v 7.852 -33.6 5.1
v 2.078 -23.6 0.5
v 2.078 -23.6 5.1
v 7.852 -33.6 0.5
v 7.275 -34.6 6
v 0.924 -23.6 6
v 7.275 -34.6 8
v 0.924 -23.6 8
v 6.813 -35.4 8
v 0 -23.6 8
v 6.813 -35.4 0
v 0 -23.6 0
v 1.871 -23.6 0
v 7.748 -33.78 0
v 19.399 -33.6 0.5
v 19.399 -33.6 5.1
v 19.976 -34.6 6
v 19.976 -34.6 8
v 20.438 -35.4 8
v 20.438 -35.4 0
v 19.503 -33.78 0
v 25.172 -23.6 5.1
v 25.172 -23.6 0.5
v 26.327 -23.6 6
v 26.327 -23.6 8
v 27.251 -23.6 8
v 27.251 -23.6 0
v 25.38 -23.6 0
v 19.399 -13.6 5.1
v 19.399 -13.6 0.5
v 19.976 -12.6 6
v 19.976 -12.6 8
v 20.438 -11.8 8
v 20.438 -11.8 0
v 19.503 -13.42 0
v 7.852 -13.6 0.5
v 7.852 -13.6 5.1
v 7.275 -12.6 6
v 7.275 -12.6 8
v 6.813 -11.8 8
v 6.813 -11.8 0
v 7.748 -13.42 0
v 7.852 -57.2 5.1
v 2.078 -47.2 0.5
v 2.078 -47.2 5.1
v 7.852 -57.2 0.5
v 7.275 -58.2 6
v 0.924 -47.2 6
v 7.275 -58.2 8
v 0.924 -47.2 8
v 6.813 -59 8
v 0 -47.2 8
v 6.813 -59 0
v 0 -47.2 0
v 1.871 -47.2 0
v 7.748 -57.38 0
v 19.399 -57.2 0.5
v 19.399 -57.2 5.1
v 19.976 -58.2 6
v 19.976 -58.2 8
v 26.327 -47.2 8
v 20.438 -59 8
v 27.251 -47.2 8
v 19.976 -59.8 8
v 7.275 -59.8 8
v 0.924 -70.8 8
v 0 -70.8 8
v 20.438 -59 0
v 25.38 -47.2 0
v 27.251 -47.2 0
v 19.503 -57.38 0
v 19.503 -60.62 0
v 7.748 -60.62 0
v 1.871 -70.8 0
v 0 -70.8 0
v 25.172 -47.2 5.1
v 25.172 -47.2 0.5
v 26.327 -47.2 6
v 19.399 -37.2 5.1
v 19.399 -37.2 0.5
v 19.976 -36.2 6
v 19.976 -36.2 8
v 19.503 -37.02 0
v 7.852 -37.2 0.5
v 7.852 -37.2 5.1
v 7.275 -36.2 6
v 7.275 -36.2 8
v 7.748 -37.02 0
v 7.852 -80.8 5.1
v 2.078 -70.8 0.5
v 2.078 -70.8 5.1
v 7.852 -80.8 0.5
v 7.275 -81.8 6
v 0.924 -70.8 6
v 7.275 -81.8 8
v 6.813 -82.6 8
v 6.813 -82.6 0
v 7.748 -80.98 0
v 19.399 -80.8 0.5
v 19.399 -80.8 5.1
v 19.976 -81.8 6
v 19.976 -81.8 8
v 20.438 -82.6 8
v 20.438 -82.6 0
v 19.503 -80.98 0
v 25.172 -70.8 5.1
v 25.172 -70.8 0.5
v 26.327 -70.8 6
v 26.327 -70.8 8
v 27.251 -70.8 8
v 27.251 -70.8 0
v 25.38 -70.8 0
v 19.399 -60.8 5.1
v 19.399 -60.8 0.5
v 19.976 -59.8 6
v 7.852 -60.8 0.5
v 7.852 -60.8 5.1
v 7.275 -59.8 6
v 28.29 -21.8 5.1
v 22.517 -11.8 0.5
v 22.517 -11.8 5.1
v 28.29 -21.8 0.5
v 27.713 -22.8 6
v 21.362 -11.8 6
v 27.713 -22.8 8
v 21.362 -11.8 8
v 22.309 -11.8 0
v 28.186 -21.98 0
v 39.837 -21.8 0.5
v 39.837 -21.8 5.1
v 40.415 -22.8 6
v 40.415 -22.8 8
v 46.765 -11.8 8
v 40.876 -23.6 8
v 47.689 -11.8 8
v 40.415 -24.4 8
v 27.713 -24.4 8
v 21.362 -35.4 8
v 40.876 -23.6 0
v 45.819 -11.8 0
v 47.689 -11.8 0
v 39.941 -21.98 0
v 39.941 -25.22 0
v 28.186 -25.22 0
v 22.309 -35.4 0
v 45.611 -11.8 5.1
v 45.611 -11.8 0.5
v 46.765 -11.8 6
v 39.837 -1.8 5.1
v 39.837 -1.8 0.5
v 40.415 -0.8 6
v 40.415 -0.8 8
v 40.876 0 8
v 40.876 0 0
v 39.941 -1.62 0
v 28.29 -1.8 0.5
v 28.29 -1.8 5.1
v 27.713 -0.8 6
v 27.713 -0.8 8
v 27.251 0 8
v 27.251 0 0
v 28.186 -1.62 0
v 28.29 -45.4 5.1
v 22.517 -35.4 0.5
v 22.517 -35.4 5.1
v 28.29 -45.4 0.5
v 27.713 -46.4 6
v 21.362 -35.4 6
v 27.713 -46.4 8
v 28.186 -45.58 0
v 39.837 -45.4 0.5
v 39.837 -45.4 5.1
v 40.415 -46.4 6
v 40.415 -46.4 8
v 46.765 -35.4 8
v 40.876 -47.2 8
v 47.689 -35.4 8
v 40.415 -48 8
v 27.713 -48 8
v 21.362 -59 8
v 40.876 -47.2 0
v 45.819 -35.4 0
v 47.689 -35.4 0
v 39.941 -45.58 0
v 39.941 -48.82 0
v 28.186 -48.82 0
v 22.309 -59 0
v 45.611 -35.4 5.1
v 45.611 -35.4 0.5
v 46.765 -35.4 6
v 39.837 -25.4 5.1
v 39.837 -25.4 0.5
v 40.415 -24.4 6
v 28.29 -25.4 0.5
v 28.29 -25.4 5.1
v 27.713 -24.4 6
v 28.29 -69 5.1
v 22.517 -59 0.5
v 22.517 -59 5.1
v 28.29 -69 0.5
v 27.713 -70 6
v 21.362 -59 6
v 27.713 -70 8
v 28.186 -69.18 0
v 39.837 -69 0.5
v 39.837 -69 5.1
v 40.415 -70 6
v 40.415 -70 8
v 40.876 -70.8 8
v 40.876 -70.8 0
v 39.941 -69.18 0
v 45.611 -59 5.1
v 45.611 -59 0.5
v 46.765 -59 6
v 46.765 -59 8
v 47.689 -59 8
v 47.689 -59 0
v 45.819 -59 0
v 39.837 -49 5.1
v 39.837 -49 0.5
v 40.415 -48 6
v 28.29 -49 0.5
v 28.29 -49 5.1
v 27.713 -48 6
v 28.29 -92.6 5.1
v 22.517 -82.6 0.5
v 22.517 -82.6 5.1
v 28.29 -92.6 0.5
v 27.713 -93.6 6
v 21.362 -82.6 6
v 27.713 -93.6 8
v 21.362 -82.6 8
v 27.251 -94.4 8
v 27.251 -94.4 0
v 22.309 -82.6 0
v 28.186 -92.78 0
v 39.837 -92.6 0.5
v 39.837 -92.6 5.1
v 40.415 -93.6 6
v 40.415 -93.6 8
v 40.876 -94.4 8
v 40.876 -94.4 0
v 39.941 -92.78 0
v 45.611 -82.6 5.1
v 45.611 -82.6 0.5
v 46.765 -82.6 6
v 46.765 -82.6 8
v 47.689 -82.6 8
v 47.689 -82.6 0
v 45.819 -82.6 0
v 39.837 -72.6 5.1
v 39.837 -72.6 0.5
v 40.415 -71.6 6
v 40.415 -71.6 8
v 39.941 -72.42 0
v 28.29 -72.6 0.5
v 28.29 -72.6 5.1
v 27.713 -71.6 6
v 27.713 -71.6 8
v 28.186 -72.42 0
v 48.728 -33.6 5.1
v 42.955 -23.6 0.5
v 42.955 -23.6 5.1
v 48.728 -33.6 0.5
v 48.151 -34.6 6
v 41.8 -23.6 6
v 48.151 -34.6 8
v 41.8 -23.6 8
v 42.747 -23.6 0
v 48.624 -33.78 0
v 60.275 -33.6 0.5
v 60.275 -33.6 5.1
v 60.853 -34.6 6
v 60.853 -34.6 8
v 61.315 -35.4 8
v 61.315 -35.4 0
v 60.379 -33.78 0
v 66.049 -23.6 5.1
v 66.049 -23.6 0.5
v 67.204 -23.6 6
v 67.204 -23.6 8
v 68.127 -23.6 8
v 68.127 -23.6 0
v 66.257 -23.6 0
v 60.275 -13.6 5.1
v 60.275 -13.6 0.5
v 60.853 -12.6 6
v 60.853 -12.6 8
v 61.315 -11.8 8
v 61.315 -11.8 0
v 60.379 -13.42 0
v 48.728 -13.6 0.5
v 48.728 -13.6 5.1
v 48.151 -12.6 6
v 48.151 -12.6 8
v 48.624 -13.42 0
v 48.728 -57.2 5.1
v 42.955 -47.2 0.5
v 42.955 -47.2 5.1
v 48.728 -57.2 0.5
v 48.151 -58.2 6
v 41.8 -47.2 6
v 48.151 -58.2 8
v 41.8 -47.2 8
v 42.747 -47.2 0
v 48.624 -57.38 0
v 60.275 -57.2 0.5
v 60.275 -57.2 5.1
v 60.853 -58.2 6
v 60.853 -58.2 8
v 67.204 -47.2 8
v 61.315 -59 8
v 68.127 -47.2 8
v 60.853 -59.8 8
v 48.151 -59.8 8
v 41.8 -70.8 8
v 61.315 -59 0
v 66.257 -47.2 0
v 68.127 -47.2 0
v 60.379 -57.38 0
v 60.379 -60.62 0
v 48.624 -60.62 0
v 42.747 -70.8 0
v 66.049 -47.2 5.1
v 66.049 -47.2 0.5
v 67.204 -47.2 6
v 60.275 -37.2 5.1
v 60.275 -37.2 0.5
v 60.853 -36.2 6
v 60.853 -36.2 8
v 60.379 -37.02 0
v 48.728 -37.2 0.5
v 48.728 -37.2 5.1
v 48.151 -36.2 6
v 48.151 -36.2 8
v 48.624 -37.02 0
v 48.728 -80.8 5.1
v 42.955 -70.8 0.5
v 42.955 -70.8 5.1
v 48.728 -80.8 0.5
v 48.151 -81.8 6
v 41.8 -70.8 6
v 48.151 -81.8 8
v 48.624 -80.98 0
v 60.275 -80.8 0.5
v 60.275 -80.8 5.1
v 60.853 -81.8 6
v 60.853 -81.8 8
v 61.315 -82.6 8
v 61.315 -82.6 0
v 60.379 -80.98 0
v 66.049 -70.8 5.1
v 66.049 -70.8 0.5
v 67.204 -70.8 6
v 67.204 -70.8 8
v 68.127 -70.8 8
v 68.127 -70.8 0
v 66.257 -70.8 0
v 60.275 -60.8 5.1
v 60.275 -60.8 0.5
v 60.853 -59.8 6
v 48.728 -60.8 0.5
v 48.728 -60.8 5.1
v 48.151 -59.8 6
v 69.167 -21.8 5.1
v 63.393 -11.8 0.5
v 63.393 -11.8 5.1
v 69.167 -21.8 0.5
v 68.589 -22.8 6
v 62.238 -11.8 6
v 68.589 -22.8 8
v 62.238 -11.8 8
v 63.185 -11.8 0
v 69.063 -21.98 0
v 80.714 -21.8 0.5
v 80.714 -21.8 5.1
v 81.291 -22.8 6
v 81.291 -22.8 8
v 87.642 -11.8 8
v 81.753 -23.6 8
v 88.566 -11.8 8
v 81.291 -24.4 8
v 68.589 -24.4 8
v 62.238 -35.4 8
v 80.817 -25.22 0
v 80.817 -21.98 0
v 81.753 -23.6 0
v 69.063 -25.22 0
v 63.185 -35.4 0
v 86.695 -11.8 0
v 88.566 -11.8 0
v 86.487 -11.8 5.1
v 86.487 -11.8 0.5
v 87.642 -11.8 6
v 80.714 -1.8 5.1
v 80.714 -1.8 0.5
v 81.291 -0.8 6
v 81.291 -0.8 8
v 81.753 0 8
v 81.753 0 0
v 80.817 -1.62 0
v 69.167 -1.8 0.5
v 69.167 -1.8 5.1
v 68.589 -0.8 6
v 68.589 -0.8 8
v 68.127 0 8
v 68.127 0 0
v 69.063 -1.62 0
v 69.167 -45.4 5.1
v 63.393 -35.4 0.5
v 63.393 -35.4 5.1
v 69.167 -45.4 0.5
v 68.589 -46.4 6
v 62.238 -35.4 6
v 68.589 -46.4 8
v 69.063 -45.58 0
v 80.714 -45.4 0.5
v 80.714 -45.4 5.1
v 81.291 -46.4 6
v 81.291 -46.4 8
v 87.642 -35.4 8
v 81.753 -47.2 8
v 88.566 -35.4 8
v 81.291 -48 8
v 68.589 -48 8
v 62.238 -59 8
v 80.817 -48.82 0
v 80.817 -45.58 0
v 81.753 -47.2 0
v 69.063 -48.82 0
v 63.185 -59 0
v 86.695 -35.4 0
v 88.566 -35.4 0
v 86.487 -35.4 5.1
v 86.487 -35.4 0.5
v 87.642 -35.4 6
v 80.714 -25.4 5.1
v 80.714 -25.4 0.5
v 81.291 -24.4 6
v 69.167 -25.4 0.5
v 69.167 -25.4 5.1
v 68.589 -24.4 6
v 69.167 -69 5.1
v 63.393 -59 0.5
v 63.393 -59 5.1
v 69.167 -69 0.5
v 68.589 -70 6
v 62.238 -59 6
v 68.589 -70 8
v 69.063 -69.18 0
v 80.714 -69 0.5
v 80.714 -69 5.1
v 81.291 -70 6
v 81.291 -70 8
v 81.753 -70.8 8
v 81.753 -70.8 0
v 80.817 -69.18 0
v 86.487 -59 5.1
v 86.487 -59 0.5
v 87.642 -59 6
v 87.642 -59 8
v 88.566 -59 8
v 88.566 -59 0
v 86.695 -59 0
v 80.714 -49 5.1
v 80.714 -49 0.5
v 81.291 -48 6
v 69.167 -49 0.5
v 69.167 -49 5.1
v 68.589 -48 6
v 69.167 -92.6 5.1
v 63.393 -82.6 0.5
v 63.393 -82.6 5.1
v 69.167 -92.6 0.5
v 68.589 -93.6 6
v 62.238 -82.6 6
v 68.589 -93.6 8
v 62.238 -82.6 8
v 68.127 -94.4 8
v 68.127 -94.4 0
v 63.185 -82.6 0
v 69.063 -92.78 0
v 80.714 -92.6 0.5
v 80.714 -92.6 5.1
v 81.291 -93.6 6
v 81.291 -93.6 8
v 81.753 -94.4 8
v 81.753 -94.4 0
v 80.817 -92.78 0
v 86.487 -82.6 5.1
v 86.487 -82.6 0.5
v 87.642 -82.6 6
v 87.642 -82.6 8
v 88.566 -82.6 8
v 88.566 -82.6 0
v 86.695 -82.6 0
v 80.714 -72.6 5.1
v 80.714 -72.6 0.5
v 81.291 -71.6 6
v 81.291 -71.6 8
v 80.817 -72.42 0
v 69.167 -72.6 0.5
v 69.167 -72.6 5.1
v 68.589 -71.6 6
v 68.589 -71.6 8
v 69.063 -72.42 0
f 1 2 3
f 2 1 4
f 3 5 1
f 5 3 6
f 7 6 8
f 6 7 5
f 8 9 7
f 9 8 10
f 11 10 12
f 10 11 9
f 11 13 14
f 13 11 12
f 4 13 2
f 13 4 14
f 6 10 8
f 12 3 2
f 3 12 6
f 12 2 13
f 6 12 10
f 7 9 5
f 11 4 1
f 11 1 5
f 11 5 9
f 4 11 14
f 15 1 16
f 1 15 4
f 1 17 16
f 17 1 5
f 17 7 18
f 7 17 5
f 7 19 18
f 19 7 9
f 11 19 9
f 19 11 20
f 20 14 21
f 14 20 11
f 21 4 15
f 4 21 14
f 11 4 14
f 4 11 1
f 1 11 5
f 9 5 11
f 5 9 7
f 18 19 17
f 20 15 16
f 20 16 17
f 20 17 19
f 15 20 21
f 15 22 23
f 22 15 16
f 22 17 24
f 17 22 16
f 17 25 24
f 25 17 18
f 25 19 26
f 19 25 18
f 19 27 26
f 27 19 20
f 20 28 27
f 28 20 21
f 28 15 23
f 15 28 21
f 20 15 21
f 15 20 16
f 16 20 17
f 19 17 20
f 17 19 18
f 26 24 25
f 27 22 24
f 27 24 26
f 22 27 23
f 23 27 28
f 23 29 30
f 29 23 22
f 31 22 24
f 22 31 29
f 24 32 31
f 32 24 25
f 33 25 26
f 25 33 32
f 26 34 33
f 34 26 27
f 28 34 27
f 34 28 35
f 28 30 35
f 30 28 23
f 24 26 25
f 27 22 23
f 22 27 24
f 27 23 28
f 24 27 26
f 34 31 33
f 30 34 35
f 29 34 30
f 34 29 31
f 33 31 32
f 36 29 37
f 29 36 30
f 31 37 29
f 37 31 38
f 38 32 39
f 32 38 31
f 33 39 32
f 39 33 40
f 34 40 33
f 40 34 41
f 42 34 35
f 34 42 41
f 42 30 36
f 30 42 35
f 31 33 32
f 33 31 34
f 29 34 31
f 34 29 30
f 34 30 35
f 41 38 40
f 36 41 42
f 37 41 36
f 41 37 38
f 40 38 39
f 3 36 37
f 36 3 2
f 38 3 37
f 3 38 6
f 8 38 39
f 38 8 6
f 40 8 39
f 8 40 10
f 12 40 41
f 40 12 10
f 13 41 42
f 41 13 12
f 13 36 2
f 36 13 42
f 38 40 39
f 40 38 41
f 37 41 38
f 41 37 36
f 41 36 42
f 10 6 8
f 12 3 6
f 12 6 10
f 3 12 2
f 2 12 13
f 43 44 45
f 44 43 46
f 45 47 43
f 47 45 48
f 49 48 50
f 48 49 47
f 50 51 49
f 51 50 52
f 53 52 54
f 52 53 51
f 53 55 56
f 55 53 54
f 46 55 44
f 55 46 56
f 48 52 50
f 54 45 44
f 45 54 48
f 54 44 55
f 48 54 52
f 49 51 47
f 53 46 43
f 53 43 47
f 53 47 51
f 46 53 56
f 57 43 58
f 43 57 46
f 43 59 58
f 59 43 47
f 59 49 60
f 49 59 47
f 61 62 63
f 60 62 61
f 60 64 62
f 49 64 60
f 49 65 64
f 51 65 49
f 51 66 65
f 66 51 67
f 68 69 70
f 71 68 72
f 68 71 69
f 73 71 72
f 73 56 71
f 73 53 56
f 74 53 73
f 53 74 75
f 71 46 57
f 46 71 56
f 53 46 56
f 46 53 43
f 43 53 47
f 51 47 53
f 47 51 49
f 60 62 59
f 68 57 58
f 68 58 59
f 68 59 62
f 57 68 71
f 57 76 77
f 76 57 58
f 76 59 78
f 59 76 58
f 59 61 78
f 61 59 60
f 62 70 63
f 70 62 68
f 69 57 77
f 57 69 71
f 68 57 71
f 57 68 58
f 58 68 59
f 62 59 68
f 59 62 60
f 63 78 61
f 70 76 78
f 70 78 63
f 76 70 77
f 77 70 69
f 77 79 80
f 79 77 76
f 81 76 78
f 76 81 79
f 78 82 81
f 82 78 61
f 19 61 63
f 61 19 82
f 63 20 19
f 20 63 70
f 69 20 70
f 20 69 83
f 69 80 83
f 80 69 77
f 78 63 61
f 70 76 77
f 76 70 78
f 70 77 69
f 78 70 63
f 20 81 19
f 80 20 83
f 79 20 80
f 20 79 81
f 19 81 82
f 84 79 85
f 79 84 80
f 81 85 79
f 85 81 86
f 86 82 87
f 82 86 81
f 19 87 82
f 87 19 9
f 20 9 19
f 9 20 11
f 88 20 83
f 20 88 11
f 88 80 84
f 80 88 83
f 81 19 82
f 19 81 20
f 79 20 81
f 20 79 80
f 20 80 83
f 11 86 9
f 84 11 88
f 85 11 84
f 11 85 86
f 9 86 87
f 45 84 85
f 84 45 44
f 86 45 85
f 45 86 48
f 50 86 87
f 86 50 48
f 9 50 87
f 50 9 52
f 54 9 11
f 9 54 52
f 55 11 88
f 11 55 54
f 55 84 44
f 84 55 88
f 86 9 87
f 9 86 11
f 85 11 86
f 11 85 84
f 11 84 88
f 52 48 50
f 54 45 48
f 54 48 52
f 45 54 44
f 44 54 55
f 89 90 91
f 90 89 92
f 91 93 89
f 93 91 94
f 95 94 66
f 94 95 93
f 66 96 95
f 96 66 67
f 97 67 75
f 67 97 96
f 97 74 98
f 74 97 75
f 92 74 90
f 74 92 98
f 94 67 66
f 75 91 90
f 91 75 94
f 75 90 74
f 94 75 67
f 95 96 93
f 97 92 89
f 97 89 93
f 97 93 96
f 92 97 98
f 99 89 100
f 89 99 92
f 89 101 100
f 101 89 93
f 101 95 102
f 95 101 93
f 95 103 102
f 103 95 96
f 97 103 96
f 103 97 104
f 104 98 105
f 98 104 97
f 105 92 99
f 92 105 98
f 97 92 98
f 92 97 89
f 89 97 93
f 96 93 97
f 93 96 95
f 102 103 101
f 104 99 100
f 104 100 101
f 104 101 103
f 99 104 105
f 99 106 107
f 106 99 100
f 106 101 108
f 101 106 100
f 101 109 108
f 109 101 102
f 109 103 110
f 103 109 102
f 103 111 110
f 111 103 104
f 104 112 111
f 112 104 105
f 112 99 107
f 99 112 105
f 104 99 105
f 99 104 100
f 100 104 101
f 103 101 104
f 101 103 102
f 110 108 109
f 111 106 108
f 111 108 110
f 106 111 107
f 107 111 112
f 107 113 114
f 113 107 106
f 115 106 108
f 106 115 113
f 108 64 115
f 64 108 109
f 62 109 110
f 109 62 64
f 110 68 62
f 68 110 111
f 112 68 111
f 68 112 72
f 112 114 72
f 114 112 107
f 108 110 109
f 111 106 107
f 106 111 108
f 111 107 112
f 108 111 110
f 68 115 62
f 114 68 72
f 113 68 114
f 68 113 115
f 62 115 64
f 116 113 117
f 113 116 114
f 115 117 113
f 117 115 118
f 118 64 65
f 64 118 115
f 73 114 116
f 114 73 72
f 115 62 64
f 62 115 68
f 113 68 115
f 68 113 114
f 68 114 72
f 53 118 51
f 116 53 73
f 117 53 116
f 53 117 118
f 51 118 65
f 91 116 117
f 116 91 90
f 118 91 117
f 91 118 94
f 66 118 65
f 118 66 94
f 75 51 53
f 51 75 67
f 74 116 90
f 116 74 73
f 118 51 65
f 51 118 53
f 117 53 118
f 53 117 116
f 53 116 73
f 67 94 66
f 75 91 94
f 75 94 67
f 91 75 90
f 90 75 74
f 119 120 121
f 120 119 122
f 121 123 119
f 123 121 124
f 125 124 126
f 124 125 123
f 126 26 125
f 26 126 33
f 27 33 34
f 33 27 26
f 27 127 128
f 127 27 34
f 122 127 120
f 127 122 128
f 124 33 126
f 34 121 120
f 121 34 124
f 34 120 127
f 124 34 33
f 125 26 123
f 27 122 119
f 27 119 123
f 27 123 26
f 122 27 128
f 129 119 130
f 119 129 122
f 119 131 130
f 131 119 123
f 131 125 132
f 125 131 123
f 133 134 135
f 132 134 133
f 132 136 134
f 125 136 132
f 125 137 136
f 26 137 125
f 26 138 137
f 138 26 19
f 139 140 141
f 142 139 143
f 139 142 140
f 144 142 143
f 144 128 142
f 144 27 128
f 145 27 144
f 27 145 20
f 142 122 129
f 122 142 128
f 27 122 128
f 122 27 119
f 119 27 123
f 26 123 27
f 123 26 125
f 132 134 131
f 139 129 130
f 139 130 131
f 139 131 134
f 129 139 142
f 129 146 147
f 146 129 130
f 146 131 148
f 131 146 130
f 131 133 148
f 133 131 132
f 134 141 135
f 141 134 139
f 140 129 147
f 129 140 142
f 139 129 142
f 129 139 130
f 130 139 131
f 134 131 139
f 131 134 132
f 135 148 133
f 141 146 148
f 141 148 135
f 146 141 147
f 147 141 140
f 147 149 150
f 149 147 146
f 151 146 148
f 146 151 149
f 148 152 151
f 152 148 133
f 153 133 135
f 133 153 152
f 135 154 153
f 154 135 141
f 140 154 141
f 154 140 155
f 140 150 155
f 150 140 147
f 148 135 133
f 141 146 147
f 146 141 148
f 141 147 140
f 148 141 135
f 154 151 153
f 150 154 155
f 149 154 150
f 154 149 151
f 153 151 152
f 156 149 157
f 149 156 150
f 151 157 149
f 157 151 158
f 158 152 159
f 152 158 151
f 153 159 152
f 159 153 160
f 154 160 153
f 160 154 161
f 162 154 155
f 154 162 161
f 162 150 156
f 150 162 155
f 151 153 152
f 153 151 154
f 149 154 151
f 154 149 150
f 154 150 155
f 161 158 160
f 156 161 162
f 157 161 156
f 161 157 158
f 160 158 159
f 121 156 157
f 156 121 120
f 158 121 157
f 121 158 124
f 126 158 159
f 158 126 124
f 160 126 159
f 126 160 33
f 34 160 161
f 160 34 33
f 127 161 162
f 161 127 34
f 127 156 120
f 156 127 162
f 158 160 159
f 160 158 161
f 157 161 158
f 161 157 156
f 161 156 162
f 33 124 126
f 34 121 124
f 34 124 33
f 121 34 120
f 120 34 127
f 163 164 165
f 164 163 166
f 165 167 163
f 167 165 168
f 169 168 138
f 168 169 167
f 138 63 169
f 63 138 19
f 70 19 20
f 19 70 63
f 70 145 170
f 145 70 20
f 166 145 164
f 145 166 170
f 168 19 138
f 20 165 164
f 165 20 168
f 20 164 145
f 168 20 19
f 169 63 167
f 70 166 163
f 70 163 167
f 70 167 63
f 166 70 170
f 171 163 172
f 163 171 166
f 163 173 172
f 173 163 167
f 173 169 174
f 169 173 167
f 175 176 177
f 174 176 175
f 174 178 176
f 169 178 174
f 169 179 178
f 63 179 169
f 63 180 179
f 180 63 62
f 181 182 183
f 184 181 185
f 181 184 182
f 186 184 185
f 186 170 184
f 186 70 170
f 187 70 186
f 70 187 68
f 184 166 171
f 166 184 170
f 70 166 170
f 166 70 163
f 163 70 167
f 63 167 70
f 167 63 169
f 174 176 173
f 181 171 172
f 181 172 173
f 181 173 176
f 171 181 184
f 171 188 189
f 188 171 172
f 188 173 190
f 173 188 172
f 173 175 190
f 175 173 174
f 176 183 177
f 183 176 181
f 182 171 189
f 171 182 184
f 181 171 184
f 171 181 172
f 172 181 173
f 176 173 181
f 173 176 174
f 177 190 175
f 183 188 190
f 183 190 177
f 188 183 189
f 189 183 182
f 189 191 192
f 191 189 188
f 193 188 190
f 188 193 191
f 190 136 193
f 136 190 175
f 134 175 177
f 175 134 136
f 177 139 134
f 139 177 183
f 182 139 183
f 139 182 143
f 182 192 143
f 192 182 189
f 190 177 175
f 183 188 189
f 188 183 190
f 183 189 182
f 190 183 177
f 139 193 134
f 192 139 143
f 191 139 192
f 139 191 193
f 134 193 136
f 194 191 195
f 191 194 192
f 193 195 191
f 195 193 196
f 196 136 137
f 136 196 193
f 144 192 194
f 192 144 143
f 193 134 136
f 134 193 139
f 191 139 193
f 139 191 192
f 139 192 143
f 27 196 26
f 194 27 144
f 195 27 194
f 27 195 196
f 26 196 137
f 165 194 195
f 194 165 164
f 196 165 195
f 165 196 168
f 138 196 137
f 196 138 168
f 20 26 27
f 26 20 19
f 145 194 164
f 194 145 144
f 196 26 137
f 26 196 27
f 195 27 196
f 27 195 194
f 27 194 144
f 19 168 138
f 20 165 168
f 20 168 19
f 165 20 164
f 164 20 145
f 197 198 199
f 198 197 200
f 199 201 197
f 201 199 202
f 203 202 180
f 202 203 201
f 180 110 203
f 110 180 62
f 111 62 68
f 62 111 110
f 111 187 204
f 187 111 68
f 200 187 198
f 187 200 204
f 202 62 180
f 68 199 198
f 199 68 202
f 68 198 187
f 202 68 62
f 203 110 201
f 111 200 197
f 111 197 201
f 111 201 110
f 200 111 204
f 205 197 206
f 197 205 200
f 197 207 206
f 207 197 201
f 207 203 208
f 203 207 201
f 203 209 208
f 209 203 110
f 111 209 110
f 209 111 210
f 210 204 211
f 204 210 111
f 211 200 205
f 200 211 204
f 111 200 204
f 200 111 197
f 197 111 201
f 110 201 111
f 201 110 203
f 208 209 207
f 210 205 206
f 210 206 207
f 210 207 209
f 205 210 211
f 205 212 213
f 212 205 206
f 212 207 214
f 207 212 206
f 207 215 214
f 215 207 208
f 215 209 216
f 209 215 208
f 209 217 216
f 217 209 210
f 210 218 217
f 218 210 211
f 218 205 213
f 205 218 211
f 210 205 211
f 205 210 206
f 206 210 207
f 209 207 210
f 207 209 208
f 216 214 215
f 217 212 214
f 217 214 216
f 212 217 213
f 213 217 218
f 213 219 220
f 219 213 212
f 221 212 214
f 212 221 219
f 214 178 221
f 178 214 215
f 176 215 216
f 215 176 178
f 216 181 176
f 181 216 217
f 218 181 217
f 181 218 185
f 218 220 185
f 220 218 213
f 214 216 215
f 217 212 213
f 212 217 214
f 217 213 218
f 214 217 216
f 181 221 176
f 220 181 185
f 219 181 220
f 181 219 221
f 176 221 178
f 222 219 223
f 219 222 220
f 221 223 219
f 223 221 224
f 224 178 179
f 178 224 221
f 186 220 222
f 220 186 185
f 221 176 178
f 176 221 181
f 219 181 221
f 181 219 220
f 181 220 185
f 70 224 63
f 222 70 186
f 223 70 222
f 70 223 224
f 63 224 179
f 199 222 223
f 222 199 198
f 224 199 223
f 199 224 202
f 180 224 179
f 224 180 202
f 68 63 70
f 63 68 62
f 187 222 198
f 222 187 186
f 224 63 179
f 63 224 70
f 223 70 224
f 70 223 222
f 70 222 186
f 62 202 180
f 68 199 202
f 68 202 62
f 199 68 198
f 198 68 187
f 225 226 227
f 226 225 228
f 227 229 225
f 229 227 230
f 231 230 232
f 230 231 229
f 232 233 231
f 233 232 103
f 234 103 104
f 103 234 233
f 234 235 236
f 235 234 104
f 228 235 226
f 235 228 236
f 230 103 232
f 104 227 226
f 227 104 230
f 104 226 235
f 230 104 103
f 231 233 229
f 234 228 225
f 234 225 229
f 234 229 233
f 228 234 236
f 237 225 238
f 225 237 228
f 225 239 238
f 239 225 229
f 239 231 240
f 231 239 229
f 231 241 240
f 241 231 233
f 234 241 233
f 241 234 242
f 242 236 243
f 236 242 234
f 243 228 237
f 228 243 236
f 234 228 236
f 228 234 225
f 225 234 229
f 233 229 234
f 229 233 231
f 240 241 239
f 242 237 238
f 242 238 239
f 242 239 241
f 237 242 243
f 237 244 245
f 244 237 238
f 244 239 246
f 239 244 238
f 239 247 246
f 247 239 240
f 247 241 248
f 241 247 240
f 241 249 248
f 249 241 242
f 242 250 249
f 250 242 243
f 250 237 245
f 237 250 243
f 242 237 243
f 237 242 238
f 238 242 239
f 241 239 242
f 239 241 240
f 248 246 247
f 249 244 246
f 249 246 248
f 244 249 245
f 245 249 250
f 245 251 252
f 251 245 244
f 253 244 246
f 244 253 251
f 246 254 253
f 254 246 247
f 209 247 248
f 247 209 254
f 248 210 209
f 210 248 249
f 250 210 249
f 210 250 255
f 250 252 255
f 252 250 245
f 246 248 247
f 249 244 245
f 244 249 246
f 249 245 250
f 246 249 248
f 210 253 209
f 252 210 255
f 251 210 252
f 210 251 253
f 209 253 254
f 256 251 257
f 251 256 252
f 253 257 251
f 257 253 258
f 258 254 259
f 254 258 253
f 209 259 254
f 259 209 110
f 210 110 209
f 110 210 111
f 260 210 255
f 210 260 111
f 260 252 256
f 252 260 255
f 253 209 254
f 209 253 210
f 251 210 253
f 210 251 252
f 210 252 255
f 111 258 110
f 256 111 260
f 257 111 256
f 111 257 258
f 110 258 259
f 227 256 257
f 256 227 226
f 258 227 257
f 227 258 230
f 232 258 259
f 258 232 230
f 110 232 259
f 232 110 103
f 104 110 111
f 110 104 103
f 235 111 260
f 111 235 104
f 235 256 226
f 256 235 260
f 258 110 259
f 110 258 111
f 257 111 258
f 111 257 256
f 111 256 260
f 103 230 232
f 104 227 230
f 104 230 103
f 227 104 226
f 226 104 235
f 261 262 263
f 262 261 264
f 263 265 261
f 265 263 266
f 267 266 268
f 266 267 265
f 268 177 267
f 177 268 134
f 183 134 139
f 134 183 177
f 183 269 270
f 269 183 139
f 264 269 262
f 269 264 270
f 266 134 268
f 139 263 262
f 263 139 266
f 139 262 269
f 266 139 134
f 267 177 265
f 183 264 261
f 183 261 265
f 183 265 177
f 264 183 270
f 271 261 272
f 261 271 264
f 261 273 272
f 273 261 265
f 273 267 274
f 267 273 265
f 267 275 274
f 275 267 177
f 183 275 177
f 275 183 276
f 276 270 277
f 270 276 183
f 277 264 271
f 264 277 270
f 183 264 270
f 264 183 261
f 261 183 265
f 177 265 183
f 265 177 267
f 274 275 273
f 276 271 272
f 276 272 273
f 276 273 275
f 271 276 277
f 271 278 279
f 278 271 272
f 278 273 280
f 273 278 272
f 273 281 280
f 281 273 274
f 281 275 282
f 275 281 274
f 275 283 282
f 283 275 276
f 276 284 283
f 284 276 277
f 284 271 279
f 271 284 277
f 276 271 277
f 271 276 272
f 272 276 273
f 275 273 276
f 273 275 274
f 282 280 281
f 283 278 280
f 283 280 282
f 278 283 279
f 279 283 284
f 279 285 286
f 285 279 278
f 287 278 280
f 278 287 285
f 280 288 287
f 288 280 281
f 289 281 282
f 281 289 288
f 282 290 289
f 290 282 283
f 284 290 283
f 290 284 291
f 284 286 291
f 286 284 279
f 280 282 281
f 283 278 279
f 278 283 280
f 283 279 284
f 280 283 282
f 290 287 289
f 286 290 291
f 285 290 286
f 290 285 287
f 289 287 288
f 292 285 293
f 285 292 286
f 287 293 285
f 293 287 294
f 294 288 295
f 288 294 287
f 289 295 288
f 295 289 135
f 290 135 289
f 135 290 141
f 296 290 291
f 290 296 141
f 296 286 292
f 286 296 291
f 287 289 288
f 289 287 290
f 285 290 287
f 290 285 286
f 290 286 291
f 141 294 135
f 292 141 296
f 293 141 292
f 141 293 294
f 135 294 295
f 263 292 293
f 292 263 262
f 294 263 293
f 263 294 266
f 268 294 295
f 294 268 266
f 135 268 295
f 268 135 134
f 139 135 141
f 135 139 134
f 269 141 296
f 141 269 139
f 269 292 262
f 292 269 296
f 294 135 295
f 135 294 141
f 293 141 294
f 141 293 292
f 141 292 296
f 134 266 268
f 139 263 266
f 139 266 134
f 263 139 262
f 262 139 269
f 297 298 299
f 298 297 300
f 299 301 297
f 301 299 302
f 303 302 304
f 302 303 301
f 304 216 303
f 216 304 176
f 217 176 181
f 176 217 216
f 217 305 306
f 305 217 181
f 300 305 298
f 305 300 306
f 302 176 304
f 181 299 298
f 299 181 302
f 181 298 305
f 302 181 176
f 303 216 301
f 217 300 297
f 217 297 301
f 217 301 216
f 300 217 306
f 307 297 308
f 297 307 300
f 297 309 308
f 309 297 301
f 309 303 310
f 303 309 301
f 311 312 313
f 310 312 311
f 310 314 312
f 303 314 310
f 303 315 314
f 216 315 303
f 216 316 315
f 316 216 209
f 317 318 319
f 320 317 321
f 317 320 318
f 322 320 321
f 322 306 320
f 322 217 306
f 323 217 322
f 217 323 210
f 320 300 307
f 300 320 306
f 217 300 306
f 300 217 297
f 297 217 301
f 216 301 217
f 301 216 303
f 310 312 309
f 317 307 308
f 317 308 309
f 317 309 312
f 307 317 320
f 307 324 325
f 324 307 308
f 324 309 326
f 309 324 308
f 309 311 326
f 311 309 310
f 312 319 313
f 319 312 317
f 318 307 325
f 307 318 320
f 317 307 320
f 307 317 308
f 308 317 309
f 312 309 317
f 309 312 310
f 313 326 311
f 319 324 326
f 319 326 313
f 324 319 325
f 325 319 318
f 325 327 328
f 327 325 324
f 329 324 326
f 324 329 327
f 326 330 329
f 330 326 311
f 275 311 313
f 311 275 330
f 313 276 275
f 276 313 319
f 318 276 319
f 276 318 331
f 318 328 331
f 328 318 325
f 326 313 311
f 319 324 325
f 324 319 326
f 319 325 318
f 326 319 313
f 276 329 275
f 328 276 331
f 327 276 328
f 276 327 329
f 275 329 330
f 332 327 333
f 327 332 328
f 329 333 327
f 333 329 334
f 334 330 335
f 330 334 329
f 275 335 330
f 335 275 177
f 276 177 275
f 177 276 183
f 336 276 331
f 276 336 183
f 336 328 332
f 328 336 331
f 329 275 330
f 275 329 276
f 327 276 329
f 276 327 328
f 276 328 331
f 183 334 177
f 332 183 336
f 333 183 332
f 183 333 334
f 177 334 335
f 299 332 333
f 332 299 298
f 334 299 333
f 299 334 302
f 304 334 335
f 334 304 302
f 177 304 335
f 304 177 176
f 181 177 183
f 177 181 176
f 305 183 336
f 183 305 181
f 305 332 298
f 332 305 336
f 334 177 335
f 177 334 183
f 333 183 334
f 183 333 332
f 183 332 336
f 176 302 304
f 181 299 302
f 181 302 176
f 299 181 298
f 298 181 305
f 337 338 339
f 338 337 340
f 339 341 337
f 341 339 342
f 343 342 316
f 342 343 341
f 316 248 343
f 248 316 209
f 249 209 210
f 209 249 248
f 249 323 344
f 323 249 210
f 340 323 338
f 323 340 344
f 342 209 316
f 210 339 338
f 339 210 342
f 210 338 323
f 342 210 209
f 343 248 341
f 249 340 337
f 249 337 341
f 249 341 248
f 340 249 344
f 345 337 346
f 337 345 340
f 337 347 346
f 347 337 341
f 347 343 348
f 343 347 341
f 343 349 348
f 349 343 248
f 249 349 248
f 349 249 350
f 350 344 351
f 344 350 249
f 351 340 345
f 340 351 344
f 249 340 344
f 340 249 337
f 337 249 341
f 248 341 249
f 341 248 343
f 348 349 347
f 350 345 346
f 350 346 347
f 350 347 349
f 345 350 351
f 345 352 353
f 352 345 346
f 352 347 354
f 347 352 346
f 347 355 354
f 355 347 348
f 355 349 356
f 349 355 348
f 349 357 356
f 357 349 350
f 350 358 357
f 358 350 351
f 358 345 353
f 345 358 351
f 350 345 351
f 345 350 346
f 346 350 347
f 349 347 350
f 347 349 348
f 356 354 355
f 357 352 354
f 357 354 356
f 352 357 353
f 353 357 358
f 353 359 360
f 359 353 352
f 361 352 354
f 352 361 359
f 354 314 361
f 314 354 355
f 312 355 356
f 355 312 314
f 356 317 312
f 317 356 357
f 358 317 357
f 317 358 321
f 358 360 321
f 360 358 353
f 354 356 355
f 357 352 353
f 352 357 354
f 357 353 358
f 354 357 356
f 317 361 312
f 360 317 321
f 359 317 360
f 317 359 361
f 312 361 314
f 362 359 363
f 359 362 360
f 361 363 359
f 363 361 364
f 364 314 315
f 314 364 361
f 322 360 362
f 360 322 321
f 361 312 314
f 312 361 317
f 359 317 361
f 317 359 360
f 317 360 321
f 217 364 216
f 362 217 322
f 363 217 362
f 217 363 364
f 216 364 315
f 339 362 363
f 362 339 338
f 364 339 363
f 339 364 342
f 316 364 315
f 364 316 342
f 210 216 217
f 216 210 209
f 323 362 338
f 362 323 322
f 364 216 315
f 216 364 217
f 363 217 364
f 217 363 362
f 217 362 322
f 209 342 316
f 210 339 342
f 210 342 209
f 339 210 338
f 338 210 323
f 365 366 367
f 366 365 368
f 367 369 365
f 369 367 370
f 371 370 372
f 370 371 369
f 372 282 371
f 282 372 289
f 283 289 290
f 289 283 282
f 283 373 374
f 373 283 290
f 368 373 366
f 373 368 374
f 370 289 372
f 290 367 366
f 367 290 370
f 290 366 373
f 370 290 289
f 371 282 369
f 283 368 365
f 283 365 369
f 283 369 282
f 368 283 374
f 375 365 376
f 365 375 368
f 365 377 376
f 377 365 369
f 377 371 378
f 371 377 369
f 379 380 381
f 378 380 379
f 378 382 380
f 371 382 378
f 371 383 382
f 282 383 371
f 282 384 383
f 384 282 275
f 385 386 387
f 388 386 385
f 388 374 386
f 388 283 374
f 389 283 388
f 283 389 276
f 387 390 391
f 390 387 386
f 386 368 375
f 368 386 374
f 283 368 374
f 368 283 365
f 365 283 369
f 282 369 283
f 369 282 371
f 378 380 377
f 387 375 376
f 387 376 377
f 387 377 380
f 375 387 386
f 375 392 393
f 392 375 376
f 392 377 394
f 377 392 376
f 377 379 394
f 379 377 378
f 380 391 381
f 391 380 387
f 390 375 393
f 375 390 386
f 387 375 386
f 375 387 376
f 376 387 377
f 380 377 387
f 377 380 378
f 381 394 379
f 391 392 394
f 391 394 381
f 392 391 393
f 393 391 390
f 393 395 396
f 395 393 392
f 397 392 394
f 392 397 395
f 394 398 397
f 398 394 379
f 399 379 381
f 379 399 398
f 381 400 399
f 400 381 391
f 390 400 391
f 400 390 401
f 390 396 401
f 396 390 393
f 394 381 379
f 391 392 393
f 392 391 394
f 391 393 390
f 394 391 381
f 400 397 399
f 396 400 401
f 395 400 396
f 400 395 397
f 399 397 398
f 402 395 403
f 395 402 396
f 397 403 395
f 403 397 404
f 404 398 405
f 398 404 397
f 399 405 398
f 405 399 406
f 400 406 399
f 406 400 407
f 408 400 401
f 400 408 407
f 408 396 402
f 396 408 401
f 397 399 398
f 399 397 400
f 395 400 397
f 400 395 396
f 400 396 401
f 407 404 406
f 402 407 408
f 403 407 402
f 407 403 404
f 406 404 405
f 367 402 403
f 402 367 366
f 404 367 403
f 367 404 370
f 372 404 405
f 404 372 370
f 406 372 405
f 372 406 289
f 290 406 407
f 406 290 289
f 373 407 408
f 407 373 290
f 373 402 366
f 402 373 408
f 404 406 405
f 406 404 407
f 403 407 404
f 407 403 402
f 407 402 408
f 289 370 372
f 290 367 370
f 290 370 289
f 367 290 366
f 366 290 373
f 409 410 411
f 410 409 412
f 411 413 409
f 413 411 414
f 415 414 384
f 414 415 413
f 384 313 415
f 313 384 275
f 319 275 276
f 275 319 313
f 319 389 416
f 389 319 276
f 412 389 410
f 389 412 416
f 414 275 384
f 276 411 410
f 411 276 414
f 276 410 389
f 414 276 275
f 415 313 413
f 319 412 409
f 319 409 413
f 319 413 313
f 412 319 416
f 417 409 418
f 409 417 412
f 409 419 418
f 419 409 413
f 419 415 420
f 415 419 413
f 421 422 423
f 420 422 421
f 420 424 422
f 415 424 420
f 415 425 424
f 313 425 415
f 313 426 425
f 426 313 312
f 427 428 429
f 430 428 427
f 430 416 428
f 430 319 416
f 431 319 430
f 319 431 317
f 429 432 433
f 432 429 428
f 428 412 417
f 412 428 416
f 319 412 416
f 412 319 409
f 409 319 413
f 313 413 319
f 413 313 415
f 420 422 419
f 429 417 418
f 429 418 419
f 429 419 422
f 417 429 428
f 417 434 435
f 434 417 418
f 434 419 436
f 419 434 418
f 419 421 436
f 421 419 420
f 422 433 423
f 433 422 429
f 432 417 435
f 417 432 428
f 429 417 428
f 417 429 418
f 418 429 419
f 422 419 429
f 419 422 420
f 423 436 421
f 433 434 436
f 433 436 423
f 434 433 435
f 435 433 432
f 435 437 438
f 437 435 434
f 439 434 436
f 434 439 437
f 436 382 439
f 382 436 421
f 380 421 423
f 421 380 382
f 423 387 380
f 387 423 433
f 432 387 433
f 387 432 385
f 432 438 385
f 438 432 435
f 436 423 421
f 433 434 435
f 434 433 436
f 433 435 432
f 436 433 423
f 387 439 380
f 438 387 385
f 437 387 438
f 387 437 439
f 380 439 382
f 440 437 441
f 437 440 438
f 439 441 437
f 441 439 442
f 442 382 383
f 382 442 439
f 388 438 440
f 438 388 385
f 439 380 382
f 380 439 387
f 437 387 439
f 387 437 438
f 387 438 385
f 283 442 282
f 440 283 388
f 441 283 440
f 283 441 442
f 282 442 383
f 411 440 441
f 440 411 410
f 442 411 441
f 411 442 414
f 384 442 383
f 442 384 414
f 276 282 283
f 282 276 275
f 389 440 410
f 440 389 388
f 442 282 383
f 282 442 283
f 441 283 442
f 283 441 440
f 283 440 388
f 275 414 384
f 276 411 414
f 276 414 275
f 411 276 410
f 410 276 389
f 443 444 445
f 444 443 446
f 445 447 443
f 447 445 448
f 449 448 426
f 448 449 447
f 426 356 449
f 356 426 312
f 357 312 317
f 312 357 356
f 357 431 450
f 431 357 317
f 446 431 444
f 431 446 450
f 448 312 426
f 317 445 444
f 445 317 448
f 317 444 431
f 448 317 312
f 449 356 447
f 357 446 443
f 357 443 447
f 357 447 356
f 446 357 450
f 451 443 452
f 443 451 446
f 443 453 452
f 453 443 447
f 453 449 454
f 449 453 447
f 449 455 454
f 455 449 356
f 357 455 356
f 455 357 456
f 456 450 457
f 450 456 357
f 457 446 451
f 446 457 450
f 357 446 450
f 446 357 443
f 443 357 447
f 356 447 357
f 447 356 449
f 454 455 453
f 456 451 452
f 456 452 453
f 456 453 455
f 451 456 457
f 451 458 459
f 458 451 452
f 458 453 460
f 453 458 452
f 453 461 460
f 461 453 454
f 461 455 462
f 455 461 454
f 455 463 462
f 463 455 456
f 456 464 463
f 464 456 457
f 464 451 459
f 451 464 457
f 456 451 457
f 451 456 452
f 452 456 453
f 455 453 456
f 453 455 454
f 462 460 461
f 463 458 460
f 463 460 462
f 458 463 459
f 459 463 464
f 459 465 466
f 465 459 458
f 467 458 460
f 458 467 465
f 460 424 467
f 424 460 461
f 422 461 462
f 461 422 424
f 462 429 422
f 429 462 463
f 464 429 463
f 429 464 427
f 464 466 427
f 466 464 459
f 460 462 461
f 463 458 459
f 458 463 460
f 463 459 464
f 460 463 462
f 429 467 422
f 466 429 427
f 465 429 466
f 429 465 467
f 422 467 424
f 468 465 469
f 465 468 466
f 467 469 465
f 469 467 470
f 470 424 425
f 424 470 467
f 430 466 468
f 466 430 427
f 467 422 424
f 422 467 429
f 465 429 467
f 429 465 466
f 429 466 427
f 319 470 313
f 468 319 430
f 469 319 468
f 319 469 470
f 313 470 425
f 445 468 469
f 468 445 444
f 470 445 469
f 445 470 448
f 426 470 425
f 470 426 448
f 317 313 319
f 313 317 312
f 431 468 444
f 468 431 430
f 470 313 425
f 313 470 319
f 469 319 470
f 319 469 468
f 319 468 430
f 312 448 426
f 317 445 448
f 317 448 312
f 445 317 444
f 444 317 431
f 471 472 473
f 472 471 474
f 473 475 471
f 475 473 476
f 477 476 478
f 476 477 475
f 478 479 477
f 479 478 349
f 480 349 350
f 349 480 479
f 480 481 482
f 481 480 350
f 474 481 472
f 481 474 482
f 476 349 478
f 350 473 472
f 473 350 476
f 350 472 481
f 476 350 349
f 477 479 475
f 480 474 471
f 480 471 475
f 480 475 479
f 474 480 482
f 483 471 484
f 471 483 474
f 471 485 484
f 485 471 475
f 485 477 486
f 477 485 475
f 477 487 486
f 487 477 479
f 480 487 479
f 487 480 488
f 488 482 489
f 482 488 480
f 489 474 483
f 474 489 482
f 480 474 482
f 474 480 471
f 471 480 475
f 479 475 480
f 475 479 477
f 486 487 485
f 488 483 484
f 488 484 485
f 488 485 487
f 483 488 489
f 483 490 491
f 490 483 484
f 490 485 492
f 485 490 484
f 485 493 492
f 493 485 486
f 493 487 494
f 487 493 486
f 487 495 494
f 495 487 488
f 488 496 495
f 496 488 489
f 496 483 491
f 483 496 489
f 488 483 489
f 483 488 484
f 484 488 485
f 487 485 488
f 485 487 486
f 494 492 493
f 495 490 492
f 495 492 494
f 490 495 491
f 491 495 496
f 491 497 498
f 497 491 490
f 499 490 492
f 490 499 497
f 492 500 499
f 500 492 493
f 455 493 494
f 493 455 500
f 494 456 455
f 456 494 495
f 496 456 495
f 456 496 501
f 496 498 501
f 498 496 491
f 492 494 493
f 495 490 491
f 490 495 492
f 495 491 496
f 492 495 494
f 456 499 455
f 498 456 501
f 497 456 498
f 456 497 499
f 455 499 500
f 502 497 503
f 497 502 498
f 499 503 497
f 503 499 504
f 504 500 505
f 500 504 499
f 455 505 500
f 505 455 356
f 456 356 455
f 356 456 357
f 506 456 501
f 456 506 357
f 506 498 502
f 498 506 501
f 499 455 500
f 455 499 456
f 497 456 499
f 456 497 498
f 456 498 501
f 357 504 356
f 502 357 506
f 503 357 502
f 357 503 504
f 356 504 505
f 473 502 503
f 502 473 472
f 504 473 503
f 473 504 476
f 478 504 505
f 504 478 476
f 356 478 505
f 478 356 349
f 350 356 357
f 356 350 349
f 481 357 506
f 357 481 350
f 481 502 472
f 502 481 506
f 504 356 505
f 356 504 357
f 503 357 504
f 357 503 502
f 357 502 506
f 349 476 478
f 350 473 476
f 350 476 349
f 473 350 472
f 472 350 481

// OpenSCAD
// Original file:
// https://www.printables.com/model/380870-customizable-honeycomb-storage-wall-openscad

/*[ Hex unit size ]*/

//Depth of the grid
depth = 8;
//Width of the hexagon's hole (flat side to flat side)
hole_width = 20;
//Thickness of the wall forming each hexagon
wall_thickness = 1.8;

/*[ Grid size settings ]*/
max_grid_width = 100;
max_grid_height = 100;

/*[ Grid shape ]*/
//If checked, ignores custom column sizes and fills grid to maximum size.
fill = true;
;
flip_staggering = true;
//Amount of hexagons per column. Each entry defines a one column, where the number specifies the amount of hex units that will be generated for the respective column. (Ignored if "fill" is checked)
columns = [3, 5, 8, 6, 4, 3, 4, 5, 6];
include_offsets = false;
//Optional: Offset for each column. This will ignore grid size limits.
column_offsets = [0, -2, -3, -1, 0, 2, 4];
include_gaps = false;
//Optional: Gaps for each column. *NOTE: Change these values in the code. Seems like 2D vector parameters aren't supported by the parameter editor and are always overwritten by the defaults.
column_gaps = [[], 
  [3, 4], 
  [4, 5], 
  [2]
];

/*[ Flat edges ]*/
edge_left = false;
edge_top = false;
edge_right = false;
edge_bottom = false;


//Calculated global variables
//Hexagon dimensions
hex_inner_r = hole_width / sqrt(3);//Inner radius/side length (center to point)
hex_h = hole_width + wall_thickness * 2;//Outer side to side distance
hex_s = hex_h / sqrt(3);//Outer radius/side length
hex_d = 2 * hex_s;//Outer diameter (point to point)
hex_t = hex_s / 2;
//Grid dimensions
max_grid_hexagons_x = fill ? floor(max_grid_width / (hex_d - hex_t) + (edge_left ? 0.5 : 0) + (edge_right ? 0.5 : 0)) : len(columns);
max_grid_hexagons_y = fill ? floor(max_grid_height / hex_h + (edge_top ? 0.5 : 0) + (edge_bottom ? 0.5 : 0)) : max(columns);
max_grid_hexagons_y_lo = fill ? floor(max_grid_height / hex_h - 0.5 + (edge_top ? 0.5 : 0) + (edge_bottom ? 0.5 : 0)) : (max(columns) - 0.5);
total_width = max_grid_hexagons_x * (hex_d - hex_t) + hex_t;
total_height = hex_h * max(max_grid_hexagons_y - 0.5, max_grid_hexagons_y_lo);


translate([edge_left ? 0 : hex_s, edge_top ? 0 : -hex_h / 2, 0])
  grid(columns, include_offsets ? column_offsets : [], include_gaps ? column_gaps : [], depth, hole_width, wall_thickness, fill);


module grid(cols, offsets, gaps, height, hole_width, wall_width, fill) {
  for(hcol = [0:fill ? max_grid_hexagons_x - 1 : (len(cols) - 1)]) {
    for(hrow = [0:(fill ? (max_grid_hexagons_y - 1) : (cols[hcol] - 1))]) {
      skip = hcol < len(gaps) && len(search(hrow + 1, gaps[hcol])) > 0;
      if (!skip) {
        offset_value = hcol > len(offsets) - 1 ? 0 : offsets[hcol];

        lo = (hcol + (flip_staggering ? 1 : 0)) % 2;
        x = (hex_d - hex_t) * hcol;
        y = -(hex_h) * (hrow + offset_value + lo / 2);

        if (hcol < max_grid_hexagons_x && hrow < (lo == 0 ? max_grid_hexagons_y : max_grid_hexagons_y_lo)) {
          left = edge_left && hcol == 0;
          top = edge_top && hrow == 0 && hcol % 2 == (flip_staggering ? 1 : 0);
          right = edge_right && hcol == max_grid_hexagons_x - 1;
          bottom = edge_bottom && hrow + 1 == (lo == 0 ? max_grid_hexagons_y : max_grid_hexagons_y_lo) && -y + hex_h > total_height + 0.001 && -y + hex_h / 2 <= total_height;
          translate([x, y, 0])
            halfhex(height, hex_s, wall_width, hole_width, left, top, right, bottom);
        }
      }
    }
  }
}

module halfhex(height, radius, wall_thickness, hole_width, left, top, right, bottom) {
  difference() {
    union() {
      hex(height, radius, wall_thickness, hole_width);
      if (left)
        translate([0, hex_h / 2, 0])
          wall(depth, wall_thickness, hex_h);
      if (top)
        translate([hex_d / 2, 0, 0])
          rotate([0, 0, -90])
            wall(depth, wall_thickness, hex_d);
      if (right)
        translate([0, -hex_h / 2, 0])
          rotate([0, 0, 180])
            wall(depth, wall_thickness, hex_h);
      if (bottom)
        translate([-hex_d / 2, 0, 0])
          rotate([0, 0, 90])
            wall(depth, wall_thickness, hex_d);
    }
    if (left)
      translate([-hex_d / 2, -hex_h, 0])
        cube([hex_d / 2, 2 * hex_h, depth]);
    if (top)
      translate([-hex_d / 2, 0, 0])
        cube([hex_d, hex_h, depth]);
    if (right)
      translate([0, -hex_h, 0])
        cube([hex_d / 2, 2 * hex_h, depth]);
    if (bottom)
      translate([-hex_d / 2, -hex_h, 0])
        cube([hex_d, hex_h, depth]);
  }
}

module hex(height, radius, wall_thickness, hole_width) {
  for(i = [0:5]) {
    rotate([0, 0, i * 60 + 30])
      translate([-hole_width / 2 - wall_thickness, radius / 2, 0])
        wall(height, wall_thickness, radius);
  }
}

module wall(height, wall_thickness, length) {
  hmax = height;
  hmin = 5.1;
  hd = 2;
  tmax = wall_thickness;
  tmin = wall_thickness - 1;
  ft = 0.18;//fillet thickness
  fh = 0.5;//fillet height

  difference() {
    rotate([90, 0, 0])
      linear_extrude(length)
        polygon([
          [0, 0], 
          [0, hmax], 
          [tmin, hmax], 
          [tmin, hmax - hd], 
          [tmax, hmin], 
          [tmax, fh], 
          [tmax - ft, 0]
        ]);
    //Fillet
    rotate([0, 0, -30])
      cube([4 * tmax, 2 * tmax, hmax]);
    mirror([0, 1, 0])
      translate([0, length, 0])
        rotate([0, 0, -30])
          cube([4 * tmax, 2 * tmax, hmax]);
  }
}
